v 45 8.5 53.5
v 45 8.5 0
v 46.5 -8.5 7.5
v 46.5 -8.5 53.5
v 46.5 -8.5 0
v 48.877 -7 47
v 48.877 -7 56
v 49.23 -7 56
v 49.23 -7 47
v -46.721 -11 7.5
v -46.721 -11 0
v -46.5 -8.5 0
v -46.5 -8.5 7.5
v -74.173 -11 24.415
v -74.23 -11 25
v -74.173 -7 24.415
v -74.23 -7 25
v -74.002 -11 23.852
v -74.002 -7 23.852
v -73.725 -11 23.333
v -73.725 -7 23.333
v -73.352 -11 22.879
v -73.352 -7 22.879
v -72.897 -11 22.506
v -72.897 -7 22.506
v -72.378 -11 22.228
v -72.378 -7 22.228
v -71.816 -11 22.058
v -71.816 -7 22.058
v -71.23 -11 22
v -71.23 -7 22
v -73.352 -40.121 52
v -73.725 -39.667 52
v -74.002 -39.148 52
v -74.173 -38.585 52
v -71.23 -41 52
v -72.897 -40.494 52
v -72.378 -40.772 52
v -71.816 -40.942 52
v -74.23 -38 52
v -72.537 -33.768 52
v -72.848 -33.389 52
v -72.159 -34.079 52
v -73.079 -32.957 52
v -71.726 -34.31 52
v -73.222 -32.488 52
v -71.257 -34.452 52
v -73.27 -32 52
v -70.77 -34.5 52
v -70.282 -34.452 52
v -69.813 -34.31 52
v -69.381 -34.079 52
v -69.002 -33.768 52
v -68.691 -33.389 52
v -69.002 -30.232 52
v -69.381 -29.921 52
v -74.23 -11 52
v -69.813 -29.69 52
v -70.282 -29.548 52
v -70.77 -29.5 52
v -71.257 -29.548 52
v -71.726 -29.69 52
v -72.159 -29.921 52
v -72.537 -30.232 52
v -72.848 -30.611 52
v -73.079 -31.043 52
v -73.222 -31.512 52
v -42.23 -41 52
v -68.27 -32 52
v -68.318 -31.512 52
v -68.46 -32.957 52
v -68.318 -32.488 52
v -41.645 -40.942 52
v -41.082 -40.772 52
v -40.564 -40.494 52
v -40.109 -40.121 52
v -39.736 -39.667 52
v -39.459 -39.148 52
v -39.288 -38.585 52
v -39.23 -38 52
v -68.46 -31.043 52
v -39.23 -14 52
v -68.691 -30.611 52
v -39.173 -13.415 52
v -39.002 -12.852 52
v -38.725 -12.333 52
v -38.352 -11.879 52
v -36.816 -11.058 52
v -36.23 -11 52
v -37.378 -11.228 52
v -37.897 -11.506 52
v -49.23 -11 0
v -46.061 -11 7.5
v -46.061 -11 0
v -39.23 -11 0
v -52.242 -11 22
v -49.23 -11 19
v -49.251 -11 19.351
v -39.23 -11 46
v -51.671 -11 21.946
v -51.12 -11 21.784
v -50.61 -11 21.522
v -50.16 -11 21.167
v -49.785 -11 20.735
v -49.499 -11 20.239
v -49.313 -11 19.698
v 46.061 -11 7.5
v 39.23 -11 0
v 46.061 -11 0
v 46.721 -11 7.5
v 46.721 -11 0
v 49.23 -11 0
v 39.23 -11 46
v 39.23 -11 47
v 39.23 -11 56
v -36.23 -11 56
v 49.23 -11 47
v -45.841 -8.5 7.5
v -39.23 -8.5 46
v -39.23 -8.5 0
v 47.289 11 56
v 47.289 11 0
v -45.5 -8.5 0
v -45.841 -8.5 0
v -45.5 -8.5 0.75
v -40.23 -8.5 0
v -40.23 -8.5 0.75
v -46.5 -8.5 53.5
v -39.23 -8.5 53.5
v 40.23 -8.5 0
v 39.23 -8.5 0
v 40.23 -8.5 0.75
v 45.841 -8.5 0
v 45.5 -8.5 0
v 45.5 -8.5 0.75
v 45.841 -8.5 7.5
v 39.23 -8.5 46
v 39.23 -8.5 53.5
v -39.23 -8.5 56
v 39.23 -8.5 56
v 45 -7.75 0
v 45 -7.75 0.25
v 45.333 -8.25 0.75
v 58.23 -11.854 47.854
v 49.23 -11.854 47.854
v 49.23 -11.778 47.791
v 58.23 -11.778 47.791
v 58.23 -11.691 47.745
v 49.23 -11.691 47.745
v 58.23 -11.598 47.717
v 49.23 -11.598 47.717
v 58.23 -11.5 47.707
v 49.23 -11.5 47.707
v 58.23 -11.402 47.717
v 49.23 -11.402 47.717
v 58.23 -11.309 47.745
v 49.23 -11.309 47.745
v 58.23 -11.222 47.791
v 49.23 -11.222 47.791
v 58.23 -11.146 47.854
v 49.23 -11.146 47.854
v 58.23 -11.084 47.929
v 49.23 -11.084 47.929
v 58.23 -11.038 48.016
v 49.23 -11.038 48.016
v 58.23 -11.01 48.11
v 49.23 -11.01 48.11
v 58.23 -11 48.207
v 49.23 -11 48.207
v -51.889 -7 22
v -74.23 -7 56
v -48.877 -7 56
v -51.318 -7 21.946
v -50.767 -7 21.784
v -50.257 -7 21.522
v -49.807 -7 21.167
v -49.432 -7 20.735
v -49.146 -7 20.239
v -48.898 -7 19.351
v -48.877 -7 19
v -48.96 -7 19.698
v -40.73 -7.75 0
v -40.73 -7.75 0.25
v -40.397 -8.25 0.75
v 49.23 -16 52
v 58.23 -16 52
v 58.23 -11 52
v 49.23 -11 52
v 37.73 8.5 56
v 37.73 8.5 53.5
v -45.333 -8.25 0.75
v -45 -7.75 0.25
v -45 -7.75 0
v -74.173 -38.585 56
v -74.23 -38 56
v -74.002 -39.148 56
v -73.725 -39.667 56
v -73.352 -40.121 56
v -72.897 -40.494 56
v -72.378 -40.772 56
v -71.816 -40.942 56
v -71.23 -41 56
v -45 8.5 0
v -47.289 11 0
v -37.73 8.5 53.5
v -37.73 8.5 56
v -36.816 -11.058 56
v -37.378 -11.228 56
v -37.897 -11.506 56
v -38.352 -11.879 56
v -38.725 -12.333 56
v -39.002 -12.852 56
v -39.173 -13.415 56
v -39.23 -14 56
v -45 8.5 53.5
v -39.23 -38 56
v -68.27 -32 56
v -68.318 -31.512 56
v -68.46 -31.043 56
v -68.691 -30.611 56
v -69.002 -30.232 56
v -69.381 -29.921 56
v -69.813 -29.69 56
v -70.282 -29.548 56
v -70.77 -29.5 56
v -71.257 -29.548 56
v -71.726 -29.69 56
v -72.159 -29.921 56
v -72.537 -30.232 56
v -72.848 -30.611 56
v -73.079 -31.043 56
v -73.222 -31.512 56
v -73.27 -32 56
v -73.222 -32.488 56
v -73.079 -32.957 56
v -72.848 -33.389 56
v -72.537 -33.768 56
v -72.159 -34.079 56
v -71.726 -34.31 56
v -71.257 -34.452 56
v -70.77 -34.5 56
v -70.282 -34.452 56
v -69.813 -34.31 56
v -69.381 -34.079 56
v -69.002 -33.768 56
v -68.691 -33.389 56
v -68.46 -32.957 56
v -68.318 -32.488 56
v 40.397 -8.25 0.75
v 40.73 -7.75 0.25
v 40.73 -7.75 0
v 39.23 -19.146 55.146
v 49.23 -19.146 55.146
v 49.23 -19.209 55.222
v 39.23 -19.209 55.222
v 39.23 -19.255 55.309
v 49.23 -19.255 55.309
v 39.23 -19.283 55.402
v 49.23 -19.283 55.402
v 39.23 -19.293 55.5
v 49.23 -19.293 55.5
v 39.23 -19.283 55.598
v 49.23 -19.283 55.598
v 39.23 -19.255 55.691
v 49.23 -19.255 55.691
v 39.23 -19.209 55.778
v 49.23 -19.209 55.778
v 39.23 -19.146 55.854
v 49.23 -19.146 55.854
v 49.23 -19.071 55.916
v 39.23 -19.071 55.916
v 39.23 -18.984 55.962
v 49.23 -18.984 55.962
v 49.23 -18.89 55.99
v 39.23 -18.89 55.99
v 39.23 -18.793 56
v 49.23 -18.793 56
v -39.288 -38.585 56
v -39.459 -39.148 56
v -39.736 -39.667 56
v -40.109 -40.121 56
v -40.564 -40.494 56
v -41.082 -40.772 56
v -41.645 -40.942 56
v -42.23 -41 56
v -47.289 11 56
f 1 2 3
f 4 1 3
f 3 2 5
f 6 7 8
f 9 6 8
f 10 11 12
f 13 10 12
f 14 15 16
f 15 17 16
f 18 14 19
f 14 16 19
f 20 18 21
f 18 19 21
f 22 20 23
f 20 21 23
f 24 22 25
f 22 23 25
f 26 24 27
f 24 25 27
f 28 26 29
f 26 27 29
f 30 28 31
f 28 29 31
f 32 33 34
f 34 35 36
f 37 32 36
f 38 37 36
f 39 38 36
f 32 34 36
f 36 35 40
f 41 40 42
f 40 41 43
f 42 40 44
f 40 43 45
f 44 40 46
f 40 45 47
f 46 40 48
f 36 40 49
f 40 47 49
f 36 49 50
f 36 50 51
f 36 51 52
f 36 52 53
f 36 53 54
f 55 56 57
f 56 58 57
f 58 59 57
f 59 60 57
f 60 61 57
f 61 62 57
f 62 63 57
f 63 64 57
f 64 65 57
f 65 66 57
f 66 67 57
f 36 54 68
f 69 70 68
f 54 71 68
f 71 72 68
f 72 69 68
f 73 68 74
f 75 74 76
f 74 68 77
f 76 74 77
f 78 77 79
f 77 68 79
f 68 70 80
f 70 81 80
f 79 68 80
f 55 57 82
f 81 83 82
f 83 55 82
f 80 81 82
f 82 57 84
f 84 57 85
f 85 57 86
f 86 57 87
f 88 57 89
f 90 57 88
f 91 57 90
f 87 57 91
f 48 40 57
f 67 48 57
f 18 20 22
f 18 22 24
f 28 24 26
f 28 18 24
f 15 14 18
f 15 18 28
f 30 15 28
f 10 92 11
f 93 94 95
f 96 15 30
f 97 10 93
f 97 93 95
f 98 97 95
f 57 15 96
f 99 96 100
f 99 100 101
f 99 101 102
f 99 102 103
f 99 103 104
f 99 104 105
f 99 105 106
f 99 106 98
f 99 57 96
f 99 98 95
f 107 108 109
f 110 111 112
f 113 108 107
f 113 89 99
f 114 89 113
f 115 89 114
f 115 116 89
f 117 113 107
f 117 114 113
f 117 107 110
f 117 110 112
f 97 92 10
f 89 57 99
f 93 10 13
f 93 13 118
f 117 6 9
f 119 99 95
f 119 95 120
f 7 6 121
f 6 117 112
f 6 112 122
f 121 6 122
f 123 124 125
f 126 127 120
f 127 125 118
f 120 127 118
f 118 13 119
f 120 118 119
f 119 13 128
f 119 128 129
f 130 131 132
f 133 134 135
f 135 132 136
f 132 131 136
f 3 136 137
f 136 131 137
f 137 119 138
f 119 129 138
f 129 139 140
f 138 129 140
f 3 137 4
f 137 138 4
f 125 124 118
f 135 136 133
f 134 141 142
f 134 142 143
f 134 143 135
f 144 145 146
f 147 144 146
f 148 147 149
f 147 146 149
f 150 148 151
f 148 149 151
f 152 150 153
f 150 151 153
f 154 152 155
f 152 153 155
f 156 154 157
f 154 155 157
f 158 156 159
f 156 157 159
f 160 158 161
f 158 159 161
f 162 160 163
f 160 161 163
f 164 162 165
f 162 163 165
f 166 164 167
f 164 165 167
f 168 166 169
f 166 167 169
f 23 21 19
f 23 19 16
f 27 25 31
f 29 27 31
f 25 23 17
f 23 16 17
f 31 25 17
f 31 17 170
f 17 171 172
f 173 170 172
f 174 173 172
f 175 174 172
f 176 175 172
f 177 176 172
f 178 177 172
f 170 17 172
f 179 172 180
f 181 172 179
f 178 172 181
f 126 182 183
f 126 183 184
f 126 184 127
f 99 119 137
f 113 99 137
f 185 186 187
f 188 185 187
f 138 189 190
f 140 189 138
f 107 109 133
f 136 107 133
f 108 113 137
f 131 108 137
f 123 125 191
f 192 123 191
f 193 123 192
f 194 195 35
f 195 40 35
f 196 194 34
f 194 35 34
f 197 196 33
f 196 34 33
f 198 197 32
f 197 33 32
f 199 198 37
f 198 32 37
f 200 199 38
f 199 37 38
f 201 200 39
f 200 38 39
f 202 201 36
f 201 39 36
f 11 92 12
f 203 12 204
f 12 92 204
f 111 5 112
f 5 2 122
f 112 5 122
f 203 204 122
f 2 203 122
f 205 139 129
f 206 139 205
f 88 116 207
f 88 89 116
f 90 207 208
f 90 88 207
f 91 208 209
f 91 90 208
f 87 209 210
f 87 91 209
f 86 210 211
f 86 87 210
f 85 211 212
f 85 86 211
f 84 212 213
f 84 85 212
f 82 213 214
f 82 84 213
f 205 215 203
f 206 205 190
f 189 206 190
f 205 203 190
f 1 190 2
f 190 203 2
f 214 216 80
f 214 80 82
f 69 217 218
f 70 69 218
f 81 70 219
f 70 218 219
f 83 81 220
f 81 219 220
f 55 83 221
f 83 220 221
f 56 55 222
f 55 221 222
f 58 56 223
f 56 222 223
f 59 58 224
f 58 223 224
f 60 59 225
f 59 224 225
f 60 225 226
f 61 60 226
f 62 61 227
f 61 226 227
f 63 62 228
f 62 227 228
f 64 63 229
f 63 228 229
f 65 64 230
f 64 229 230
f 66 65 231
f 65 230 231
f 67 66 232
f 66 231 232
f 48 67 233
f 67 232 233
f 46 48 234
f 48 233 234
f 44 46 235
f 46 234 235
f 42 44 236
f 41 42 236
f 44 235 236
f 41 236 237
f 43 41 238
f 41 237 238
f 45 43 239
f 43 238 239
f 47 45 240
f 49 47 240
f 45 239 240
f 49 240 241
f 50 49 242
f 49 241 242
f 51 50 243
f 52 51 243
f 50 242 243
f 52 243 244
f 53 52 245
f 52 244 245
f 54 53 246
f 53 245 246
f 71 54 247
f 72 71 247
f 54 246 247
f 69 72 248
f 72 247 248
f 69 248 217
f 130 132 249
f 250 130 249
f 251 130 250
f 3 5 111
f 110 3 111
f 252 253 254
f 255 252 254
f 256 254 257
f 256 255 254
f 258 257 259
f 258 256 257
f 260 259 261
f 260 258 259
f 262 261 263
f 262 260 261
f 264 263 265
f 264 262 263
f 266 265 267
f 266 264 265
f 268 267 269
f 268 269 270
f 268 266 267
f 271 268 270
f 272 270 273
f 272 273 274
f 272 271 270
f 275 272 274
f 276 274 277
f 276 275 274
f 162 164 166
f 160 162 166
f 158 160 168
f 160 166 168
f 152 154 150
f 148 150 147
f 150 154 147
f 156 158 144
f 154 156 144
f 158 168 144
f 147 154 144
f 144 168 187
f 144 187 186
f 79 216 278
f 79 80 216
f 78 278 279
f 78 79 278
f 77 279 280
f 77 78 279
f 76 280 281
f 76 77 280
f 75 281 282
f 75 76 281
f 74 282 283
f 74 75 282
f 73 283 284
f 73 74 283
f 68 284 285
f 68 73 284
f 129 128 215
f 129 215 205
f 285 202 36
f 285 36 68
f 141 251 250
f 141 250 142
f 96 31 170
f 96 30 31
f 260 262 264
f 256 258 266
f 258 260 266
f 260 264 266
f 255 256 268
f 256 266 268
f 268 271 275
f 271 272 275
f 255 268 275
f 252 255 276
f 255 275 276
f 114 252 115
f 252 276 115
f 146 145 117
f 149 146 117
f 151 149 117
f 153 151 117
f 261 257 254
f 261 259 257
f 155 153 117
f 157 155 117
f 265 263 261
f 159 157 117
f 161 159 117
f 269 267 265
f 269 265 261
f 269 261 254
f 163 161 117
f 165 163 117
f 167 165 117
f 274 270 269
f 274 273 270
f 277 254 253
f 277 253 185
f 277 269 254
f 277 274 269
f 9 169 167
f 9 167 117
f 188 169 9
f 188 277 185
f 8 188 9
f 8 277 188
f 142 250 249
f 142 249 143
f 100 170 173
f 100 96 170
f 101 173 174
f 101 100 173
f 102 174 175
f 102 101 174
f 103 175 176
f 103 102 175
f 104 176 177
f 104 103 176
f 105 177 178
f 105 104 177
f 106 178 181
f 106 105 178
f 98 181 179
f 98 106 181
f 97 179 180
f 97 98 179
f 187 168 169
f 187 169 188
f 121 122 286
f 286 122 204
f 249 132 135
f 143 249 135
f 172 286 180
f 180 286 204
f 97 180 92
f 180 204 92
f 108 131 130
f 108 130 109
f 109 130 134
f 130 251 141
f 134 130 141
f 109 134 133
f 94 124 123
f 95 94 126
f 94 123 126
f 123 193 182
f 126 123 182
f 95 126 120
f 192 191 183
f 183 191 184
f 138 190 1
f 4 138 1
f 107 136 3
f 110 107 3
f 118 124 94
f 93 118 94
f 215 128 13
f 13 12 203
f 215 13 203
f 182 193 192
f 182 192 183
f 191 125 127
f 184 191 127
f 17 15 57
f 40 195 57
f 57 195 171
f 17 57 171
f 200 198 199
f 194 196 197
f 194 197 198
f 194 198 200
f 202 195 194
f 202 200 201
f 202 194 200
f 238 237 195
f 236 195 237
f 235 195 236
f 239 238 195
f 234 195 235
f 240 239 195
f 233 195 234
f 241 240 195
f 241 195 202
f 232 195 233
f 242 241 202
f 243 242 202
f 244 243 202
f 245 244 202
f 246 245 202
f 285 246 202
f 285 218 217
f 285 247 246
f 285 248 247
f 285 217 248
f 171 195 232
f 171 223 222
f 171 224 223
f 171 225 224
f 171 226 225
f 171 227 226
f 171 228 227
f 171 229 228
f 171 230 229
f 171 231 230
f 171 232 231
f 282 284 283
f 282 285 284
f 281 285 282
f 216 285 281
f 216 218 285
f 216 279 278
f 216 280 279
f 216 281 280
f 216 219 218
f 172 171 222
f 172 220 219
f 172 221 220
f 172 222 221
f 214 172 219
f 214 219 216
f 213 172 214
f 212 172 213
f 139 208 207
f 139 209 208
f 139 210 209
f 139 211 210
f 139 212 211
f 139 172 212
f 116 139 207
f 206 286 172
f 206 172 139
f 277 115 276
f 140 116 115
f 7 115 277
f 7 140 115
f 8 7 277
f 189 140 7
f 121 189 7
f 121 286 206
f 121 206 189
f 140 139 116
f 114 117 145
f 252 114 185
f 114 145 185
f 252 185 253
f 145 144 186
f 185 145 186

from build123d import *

# Parameters (mm, degrees)
F1_DEPTH     = 56
F3_DEPTH     = 2.5
F5_DEPTH     = 0.75
F6_SIZE      = 0.5
F7_SIZE      = 0.5
F9_DEPTH     = 7.5
F11_DEPTH    = 4
F13_DEPTH    = 30
F15_DEPTH    = 5
F16_W        = 4
F16_H        = 9
F17_DEPTH    = 9
F19_DEPTH    = 10
F20_T1_DEPTH = 25.0355339059
F20_T3_DEPTH = 10.25
F20_T5_DEPTH = 12.017766953
F21_W        = 78.4606024017
F21_H        = 2.5
F22_DEPTH    = 10
F23_R        = 2.5
F24_DEPTH    = 4
F25_R        = 3
F27_DEPTH    = 9


# Not quite as in the source:
# - a fillet or chamfer that OpenCascade refuses, or shapes differently, is made with other operations: its cross-section is extruded or revolved along the edge and cut away or added


with BuildPart() as f1:
    # F0 (on Top) → F1 (new body)
    with BuildSketch(Plane.XY):
        Polygon((-39.2303012009, -8.5), (-46.5, -8.5), (-45, 8.5), (45, 8.5), (46.5, -8.5), (39.2303012009, -8.5), (39.2303012009, -11), (49.2303012009, -11), (47.2891247303, 11), (-47.2891247303, 11), (-49.2303012009, -11), (-39.2303012009, -11), align=None)
    extrude(amount=F1_DEPTH)

    # F2 (on face) → F3 (join)
    with BuildSketch(Plane.XY.offset(56)):
        Polygon((-46.5, -8.5), (-39.2303012009, -8.5), (-37.7303012009, 8.5), (-45, 8.5), align=None)
        Polygon((46.5, -8.5), (45, 8.5), (37.7303012009, 8.5), (39.2303012009, -8.5), align=None)
    extrude(amount=-F3_DEPTH)

    # F4 (on face) → F5 (join)
    with BuildSketch(Plane(origin=(0, 0, 0), x_dir=(1, 0, 0), z_dir=(0, 0, -1))):
        Polygon((-40.7303012009, 7.75), (-40.2303012009, 8.5), (-45.5, 8.5), (-45, 7.75), align=None)
        Polygon((45, 7.75), (45.5, 8.5), (40.2303012009, 8.5), (40.7303012009, 7.75), align=None)
    extrude(amount=-F5_DEPTH)

    # F6
    f6_edges = [f1.edges().sort_by_distance(p)[0] for p in [
        (42.865151, -7.75, 0.75),
    ]]
    chamfer(f6_edges, length=F6_SIZE)

    # F7
    f7_edges = [f1.edges().sort_by_distance(p)[0] for p in [
        (-42.865151, -7.75, 0.75),
    ]]
    chamfer(f7_edges, length=F7_SIZE)

    # F8 (on face) → F9 (cut)
    with BuildSketch(Plane(origin=(0, 0, 0), x_dir=(1, 0, 0), z_dir=(0, 0, -1))):
        Polygon((-46.7205882353, 11), (-46.5, 8.5), (-45.8406183737, 8.5), (-46.061206609, 11), align=None)
        Polygon((46.5, 8.5), (46.7205882353, 11), (46.061206609, 11), (45.8406183737, 8.5), align=None)
    extrude(amount=-F9_DEPTH, mode=Mode.SUBTRACT)

    # F10 (on face) → F11 (join)
    with BuildSketch(Plane.XY.offset(56)):
        Polygon((-74.2303012009, -7), (-74.2303012009, -11), (-74.2303012009, -41), (-39.2303012009, -41), (-39.2303012009, -11), (-49.2303012009, -11), (-48.8773600244, -7), align=None)
        Polygon((49.2303012009, -11), (39.2303012009, -11), (39.2303012009, -20), (58.2303012009, -20), (58.2303012009, -11), (58.2303012009, -7), (48.8773600244, -7), align=None)
    extrude(amount=-F11_DEPTH)

    # F12 (on face) → F13 (join)
    with BuildSketch(Plane(origin=(0, 0, 52), x_dir=(1, 0, 0), z_dir=(0, 0, -1))):
        Polygon((-74.2303012009, 7), (-48.8773600244, 7), (-49.2303012009, 11), (-74.2303012009, 11), align=None)
    extrude(amount=F13_DEPTH)

    # F14 (on face) → F15 (join)
    with BuildSketch(Plane(origin=(0, 0, 52), x_dir=(1, 0, 0), z_dir=(0, 0, -1))):
        Polygon((58.2303012009, 20), (39.2303012009, 20), (39.2303012009, 11), (49.2303012009, 11), (48.8773600244, 7), (58.2303012009, 7), align=None)
    extrude(amount=F15_DEPTH)

    # F16 (on face) → F17 (cut)
    with BuildSketch(Plane.YZ.offset(58.2303012009)):
        Polygon((-11, 47), (-20, 56), (-20, 47), align=None)
        with Locations((-9, 51.5)):
            Rectangle(F16_W, F16_H)
    extrude(amount=-F17_DEPTH, mode=Mode.SUBTRACT)

    # F18 (on face) → F19 (cut)
    with BuildSketch(Plane.YZ.offset(49.2303012009)):
        Polygon((-11, 47), (-20, 56), (-20, 47), align=None)
    extrude(amount=-F19_DEPTH, mode=Mode.SUBTRACT)

    # F20: fillet of radius 0.5 on 3 edges, made by hand

    # F20_s2 → F20_t1 (cut)
    with BuildSketch(Plane.YZ.offset(36.2125342479)):
        with BuildLine():
            ThreePointArc((-19.1464466094, 55.1464466094), (-19.2548329851, 55.6913417162), (-18.7928932188, 56))
            Line((-18.7928932188, 56), (-20, 56))
            Line((-20, 56), (-19.1464466094, 55.1464466094))
        make_face()
    extrude(amount=F20_T1_DEPTH, mode=Mode.SUBTRACT)

    # F20_s4 → F20_t3 (cut)
    with BuildSketch(Plane.YZ.offset(49.2303012009)):
        with BuildLine():
            ThreePointArc((-11, 55.5), (-11.1464466094, 55.8535533906), (-11.5, 56))
            Line((-11.5, 56), (-11, 56))
            Line((-11, 56), (-11, 55.5))
        make_face()
    extrude(amount=F20_T3_DEPTH, mode=Mode.SUBTRACT)

    # F20_s6 → F20_t5 (cut)
    with BuildSketch(Plane.YZ.offset(49.2303012009)):
        with BuildLine():
            ThreePointArc((-11.8535533906, 47.8535533906), (-11.3086582838, 47.7451670149), (-11, 48.2071067812))
            Line((-11, 48.2071067812), (-11, 47))
            Line((-11, 47), (-11.8535533906, 47.8535533906))
        make_face()
    extrude(amount=F20_T5_DEPTH, mode=Mode.SUBTRACT)

    # F21 (on face) → F22 (join)
    with BuildSketch(Plane.XY.offset(56)):
        with Locations((0, -9.75)):
            Rectangle(F21_W, F21_H)
    extrude(amount=-F22_DEPTH)

    # F23 (on face) → F24 (cut)
    with BuildSketch(Plane.XY.offset(56)):
        with Locations((-70.7696987991, -32)):
            Circle(F23_R)
    extrude(amount=-F24_DEPTH, mode=Mode.SUBTRACT)

    # F25
    f25_edges = [f1.edges().sort_by_distance(p)[0] for p in [
        (-74.230301, -41, 54),
        (-39.230301, -41, 54),
        (-74.230301, -9, 22),
        (-49.053831, -9, 22),
        (-39.230301, -11, 54),
    ]]
    fillet(f25_edges, radius=F25_R)

    # F26 (on face) → F27 (cut)
    with BuildSketch(Plane.YZ.offset(58.2303012009)):
        Polygon((-11, 52), (-11, 56), (-20, 56), (-16, 52), align=None)
    extrude(amount=-F27_DEPTH, mode=Mode.SUBTRACT)


solid = f1.part
